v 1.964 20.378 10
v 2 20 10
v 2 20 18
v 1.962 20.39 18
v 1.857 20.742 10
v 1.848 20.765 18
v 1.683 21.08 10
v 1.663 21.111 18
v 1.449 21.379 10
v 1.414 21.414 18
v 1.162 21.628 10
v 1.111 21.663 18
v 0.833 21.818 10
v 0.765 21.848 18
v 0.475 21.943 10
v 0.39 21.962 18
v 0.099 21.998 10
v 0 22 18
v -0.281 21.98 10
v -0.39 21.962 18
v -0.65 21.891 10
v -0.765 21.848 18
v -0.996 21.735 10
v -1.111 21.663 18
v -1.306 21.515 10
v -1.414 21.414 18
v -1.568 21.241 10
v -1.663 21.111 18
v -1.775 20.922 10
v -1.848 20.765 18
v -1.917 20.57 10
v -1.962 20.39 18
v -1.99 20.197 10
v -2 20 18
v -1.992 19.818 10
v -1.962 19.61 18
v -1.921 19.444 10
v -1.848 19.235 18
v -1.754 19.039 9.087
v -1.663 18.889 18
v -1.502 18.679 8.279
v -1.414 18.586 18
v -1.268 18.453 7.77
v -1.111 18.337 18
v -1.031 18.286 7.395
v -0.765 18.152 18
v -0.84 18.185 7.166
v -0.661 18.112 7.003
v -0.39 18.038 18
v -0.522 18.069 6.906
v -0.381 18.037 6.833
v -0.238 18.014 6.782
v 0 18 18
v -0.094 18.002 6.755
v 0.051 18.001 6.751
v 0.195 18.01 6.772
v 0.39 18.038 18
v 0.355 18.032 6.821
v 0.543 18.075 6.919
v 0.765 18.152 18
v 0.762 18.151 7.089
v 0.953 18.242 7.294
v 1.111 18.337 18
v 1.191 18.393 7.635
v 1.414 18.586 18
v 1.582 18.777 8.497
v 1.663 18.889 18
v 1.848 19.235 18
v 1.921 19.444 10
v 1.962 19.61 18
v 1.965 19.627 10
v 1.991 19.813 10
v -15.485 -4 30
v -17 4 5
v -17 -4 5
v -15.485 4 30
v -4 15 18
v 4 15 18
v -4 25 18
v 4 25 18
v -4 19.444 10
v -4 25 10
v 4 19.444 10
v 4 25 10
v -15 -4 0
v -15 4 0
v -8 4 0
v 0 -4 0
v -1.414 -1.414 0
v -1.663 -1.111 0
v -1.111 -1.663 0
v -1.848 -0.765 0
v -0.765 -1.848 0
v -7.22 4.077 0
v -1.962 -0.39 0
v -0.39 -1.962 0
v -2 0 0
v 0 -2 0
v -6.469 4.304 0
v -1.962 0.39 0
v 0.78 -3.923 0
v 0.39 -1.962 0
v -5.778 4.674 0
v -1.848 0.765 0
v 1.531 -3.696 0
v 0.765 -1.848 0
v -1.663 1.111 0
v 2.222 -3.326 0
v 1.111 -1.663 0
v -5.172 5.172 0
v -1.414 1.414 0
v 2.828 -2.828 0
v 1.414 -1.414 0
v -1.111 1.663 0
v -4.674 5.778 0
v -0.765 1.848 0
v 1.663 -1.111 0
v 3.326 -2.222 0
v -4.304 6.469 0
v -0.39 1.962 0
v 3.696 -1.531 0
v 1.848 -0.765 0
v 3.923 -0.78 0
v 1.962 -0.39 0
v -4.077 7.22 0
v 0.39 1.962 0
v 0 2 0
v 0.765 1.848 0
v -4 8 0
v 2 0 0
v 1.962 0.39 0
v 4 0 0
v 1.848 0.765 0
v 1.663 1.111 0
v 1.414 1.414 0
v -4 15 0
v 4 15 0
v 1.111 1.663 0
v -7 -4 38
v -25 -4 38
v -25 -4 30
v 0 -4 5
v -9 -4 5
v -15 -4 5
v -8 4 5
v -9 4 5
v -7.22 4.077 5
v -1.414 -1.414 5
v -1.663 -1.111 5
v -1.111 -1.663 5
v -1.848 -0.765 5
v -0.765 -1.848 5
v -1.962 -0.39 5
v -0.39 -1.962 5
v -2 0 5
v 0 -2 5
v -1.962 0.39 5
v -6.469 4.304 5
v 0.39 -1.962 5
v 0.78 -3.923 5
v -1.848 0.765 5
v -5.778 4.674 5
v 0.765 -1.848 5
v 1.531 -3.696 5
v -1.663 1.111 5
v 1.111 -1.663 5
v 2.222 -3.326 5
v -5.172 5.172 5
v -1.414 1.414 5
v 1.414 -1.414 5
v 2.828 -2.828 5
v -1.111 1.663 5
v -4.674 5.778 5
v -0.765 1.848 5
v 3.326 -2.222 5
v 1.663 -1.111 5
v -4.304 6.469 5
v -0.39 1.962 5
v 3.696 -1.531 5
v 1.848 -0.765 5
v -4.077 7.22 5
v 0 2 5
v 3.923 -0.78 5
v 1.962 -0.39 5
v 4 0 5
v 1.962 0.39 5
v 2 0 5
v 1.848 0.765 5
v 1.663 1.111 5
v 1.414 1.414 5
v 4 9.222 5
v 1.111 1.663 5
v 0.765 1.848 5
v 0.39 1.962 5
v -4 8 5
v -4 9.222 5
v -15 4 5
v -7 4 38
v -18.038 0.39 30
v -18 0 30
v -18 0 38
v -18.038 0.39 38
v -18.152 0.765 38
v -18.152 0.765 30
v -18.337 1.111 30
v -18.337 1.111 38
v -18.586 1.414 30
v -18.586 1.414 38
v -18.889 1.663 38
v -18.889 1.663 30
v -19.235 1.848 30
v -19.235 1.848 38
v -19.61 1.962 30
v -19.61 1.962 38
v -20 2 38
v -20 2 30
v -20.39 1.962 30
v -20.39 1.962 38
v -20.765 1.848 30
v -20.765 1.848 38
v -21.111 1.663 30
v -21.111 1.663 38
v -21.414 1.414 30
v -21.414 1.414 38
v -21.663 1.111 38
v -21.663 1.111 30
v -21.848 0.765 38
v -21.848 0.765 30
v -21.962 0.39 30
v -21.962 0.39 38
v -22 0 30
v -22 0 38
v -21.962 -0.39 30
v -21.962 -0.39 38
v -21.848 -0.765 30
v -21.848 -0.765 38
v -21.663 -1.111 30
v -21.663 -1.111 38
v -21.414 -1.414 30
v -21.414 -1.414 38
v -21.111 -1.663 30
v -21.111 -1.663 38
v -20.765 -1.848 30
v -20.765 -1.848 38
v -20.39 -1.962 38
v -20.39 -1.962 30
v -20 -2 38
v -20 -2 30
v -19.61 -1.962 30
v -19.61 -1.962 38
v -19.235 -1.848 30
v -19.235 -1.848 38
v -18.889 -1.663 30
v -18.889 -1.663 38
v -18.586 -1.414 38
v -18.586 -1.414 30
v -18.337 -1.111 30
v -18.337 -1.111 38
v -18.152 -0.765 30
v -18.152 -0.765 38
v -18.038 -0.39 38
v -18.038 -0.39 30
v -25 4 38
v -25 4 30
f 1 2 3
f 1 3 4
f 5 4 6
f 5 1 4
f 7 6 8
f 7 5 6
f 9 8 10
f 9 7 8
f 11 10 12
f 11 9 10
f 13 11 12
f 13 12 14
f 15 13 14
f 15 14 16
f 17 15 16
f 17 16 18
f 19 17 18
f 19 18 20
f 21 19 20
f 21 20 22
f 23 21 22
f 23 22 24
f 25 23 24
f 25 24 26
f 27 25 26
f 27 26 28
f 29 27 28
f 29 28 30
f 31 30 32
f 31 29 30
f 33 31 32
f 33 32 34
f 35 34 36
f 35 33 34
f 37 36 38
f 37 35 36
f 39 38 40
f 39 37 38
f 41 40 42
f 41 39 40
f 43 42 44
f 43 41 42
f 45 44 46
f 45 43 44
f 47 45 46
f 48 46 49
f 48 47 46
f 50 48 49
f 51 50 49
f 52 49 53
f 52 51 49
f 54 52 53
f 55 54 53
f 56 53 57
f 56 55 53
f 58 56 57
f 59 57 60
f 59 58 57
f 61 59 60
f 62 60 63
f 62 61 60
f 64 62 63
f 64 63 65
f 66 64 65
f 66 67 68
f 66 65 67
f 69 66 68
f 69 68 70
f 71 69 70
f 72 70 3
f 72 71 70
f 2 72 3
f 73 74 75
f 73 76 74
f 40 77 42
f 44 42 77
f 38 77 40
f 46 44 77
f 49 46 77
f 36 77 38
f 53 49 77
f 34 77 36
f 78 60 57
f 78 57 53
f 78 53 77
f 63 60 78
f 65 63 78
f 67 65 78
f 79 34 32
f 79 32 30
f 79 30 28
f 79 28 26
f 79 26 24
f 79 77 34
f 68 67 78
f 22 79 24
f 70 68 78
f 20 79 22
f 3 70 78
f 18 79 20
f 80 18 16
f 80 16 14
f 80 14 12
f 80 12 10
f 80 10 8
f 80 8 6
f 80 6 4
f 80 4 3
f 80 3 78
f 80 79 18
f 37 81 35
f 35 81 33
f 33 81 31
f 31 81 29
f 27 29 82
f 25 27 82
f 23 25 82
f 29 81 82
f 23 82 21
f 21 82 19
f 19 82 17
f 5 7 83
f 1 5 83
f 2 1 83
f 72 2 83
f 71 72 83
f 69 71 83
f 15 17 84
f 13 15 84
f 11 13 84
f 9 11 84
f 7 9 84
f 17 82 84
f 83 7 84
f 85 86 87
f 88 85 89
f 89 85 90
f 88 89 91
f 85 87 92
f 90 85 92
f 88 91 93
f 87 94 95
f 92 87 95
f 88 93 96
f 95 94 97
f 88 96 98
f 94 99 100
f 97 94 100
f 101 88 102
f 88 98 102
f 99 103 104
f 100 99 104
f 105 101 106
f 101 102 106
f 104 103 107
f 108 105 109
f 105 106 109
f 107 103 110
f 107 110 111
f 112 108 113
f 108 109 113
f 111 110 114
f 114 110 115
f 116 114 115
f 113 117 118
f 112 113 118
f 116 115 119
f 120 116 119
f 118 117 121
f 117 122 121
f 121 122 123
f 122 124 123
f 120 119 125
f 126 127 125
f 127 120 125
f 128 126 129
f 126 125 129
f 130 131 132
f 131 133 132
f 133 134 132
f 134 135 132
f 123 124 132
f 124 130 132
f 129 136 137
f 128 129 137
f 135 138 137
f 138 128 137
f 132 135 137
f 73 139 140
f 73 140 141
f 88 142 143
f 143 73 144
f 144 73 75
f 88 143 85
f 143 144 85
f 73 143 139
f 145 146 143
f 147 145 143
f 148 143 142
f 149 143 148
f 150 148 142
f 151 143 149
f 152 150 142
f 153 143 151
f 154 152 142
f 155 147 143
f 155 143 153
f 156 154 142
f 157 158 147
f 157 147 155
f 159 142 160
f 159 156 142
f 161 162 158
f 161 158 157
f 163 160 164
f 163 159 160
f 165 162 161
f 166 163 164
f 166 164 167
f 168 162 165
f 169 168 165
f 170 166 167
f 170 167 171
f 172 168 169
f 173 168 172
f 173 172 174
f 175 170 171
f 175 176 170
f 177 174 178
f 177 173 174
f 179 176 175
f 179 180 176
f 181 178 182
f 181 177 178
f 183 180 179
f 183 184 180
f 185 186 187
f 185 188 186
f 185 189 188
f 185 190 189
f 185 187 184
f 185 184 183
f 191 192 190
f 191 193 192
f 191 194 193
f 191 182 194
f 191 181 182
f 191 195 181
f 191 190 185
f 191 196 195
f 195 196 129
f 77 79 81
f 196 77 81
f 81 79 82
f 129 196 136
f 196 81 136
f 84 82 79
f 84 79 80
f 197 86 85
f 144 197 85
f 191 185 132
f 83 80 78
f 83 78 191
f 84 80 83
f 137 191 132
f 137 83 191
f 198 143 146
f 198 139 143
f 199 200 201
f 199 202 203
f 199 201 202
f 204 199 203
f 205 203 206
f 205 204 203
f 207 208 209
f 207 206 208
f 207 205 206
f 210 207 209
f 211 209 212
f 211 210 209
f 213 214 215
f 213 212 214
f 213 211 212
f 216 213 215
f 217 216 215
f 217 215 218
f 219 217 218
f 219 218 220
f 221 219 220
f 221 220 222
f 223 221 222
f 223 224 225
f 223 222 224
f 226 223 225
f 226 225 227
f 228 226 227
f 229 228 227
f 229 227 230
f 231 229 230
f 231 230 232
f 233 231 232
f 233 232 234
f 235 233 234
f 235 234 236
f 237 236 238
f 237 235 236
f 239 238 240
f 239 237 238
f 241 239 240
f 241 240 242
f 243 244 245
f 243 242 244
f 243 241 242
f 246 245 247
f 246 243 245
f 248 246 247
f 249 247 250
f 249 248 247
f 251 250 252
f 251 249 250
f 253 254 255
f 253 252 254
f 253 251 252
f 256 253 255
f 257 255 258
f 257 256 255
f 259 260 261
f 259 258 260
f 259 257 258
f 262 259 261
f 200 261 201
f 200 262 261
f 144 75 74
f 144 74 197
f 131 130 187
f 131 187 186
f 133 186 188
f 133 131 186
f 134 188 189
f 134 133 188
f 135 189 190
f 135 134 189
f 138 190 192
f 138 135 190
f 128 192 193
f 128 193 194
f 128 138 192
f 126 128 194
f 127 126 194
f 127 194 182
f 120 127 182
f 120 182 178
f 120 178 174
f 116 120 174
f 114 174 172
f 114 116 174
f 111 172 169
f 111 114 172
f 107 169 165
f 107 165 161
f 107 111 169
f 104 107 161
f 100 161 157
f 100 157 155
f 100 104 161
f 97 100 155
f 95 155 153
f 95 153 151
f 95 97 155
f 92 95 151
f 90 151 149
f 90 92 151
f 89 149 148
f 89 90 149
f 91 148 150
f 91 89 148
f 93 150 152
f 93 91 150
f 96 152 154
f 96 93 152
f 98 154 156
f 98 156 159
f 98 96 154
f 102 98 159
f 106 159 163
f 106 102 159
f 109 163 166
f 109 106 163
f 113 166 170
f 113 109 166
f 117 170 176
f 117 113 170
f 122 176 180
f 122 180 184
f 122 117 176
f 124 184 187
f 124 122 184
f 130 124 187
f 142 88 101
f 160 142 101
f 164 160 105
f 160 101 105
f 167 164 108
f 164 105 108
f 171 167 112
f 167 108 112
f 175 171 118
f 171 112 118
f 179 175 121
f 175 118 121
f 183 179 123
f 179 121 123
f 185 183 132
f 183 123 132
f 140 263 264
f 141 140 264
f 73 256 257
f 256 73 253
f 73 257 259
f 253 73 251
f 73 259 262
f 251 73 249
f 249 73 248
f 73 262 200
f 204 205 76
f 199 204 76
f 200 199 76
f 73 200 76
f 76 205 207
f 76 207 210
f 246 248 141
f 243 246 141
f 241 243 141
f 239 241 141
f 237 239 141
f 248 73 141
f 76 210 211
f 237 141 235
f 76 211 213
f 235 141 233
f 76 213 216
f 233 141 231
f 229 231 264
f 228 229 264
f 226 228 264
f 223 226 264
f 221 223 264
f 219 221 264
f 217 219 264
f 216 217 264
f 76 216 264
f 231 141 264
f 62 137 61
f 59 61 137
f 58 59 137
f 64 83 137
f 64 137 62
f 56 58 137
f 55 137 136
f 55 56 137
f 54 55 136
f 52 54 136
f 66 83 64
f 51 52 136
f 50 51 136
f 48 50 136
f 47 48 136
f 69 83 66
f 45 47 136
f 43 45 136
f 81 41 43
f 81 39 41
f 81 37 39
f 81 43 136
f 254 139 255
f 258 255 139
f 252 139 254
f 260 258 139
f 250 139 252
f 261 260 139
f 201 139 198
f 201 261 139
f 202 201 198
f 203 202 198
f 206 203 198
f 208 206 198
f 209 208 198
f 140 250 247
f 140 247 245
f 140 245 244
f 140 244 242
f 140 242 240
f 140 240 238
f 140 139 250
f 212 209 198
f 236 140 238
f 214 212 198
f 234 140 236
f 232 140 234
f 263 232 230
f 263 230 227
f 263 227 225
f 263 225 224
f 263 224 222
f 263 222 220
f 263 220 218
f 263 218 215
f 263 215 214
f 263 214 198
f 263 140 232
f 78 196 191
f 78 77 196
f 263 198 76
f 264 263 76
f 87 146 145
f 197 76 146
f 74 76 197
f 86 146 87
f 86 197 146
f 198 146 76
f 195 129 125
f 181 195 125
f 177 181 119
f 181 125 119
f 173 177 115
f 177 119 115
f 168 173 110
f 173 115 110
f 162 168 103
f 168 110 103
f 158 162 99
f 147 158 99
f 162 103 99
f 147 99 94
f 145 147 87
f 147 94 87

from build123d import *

# Parameters (mm, degrees)
SKETCH_1_R          = 2
EXTRUDE_1_DEPTH     = 5
SKETCH_7_W          = 8
SKETCH_7_H          = 8
SKETCH_6_W          = 8
SKETCH_6_H          = 8
SKETCH_9_W          = 8
SKETCH_9_H          = 8
EXTRUDE_5_DEPTH     = 10
SKETCH_1_6_R        = 2
CUT_EXTRUDE_2_DEPTH = 99
SKETCH_14_W         = 8
SKETCH_14_H         = 8
SKETCH_15_W         = 8
SKETCH_15_H         = 8
EXTRUDE_7_REACH     = 31
SKETCH_17_W         = 8
SKETCH_17_H         = 8
SKETCH_1_7_R        = 2
CUT_EXTRUDE_4_DEPTH = 33.5


with BuildPart() as part:
    # 草图1 → 凸台-拉伸1 (new body)
    with BuildSketch(Plane.XY):
        with BuildLine():
            Line((-15, 4), (-15, -4))
            Line((-15, -4), (0, -4))
            ThreePointArc((0, -4), (2.828427125, -2.828427125), (4, 0))
            Line((4, 0), (4, 15))
            Line((4, 15), (-4, 15))
            Line((-4, 15), (-4, 8))
            ThreePointArc((-4, 8), (-5.171572875, 5.171572875), (-8, 4))
            Line((-8, 4), (-15, 4))
        make_face()
        Circle(SKETCH_1_R, mode=Mode.SUBTRACT)
    extrude(amount=EXTRUDE_1_DEPTH)

    # 草图7 → 放样2 section 0
    with BuildSketch(Plane.XY.offset(5)):
        with Locations((-13, 0)):
            Rectangle(SKETCH_7_W, SKETCH_7_H)
    # 草图6 → 放样2 section 1
    with BuildSketch(Plane.XY.offset(38)):
        with Locations((-11, 0)):
            Rectangle(SKETCH_6_W, SKETCH_6_H)
    loft()

    # 草图9 → 凸台-拉伸5 (add)
    with BuildSketch(Plane(origin=(-25, 0, 0), x_dir=(0, 0, -1), z_dir=(1, 0, 0))):
        with Locations((-34, 0)):
            Rectangle(SKETCH_9_W, SKETCH_9_H)
    extrude(amount=EXTRUDE_5_DEPTH)

    # 草图1<6> → 切除-拉伸2 (cut)
    with BuildSketch(Plane.XY):
        with Locations((-20, 0)):
            Circle(SKETCH_1_6_R)
    extrude(amount=CUT_EXTRUDE_2_DEPTH, mode=Mode.SUBTRACT)

    # 草图14 → 放样3 section 0
    with BuildSketch(Plane.XY):
        with Locations((0, 11)):
            Rectangle(SKETCH_14_W, SKETCH_14_H)
    # 草图15 → 放样3 section 1
    with BuildSketch(Plane.XY.offset(18)):
        with Locations((0, 19)):
            Rectangle(SKETCH_15_W, SKETCH_15_H)
    loft()

    # 凸台-拉伸7: up to this face of the body (flat: up to its plane)
    extrude_7_end = Plane(part.part.faces().sort_by_distance((0, 19, 9))[0])
    # 草图17 → 凸台-拉伸7 (add, up to the picked face)
    with BuildSketch(Plane(origin=(0, 25, 0), x_dir=(1, 0, 0), z_dir=(0, 1, 0)), mode=Mode.PRIVATE) as extrude_7_sk1:
        with Locations((0, -14)):
            Rectangle(SKETCH_17_W, SKETCH_17_H)
    extrude_7_tool1 = split(extrude(extrude_7_sk1.sketch, amount=-EXTRUDE_7_REACH, mode=Mode.PRIVATE), bisect_by=extrude_7_end, keep=Keep.BOTH, mode=Mode.PRIVATE)
    add(extrude_7_tool1.solids().sort_by_distance((0, 25, 14))[0])

    # 草图1<7> → 切除-拉伸4 (cut)
    with BuildSketch(Plane.XY):
        with Locations((0, 20)):
            Circle(SKETCH_1_7_R)
    extrude(amount=CUT_EXTRUDE_4_DEPTH, mode=Mode.SUBTRACT)


solid = part.part
